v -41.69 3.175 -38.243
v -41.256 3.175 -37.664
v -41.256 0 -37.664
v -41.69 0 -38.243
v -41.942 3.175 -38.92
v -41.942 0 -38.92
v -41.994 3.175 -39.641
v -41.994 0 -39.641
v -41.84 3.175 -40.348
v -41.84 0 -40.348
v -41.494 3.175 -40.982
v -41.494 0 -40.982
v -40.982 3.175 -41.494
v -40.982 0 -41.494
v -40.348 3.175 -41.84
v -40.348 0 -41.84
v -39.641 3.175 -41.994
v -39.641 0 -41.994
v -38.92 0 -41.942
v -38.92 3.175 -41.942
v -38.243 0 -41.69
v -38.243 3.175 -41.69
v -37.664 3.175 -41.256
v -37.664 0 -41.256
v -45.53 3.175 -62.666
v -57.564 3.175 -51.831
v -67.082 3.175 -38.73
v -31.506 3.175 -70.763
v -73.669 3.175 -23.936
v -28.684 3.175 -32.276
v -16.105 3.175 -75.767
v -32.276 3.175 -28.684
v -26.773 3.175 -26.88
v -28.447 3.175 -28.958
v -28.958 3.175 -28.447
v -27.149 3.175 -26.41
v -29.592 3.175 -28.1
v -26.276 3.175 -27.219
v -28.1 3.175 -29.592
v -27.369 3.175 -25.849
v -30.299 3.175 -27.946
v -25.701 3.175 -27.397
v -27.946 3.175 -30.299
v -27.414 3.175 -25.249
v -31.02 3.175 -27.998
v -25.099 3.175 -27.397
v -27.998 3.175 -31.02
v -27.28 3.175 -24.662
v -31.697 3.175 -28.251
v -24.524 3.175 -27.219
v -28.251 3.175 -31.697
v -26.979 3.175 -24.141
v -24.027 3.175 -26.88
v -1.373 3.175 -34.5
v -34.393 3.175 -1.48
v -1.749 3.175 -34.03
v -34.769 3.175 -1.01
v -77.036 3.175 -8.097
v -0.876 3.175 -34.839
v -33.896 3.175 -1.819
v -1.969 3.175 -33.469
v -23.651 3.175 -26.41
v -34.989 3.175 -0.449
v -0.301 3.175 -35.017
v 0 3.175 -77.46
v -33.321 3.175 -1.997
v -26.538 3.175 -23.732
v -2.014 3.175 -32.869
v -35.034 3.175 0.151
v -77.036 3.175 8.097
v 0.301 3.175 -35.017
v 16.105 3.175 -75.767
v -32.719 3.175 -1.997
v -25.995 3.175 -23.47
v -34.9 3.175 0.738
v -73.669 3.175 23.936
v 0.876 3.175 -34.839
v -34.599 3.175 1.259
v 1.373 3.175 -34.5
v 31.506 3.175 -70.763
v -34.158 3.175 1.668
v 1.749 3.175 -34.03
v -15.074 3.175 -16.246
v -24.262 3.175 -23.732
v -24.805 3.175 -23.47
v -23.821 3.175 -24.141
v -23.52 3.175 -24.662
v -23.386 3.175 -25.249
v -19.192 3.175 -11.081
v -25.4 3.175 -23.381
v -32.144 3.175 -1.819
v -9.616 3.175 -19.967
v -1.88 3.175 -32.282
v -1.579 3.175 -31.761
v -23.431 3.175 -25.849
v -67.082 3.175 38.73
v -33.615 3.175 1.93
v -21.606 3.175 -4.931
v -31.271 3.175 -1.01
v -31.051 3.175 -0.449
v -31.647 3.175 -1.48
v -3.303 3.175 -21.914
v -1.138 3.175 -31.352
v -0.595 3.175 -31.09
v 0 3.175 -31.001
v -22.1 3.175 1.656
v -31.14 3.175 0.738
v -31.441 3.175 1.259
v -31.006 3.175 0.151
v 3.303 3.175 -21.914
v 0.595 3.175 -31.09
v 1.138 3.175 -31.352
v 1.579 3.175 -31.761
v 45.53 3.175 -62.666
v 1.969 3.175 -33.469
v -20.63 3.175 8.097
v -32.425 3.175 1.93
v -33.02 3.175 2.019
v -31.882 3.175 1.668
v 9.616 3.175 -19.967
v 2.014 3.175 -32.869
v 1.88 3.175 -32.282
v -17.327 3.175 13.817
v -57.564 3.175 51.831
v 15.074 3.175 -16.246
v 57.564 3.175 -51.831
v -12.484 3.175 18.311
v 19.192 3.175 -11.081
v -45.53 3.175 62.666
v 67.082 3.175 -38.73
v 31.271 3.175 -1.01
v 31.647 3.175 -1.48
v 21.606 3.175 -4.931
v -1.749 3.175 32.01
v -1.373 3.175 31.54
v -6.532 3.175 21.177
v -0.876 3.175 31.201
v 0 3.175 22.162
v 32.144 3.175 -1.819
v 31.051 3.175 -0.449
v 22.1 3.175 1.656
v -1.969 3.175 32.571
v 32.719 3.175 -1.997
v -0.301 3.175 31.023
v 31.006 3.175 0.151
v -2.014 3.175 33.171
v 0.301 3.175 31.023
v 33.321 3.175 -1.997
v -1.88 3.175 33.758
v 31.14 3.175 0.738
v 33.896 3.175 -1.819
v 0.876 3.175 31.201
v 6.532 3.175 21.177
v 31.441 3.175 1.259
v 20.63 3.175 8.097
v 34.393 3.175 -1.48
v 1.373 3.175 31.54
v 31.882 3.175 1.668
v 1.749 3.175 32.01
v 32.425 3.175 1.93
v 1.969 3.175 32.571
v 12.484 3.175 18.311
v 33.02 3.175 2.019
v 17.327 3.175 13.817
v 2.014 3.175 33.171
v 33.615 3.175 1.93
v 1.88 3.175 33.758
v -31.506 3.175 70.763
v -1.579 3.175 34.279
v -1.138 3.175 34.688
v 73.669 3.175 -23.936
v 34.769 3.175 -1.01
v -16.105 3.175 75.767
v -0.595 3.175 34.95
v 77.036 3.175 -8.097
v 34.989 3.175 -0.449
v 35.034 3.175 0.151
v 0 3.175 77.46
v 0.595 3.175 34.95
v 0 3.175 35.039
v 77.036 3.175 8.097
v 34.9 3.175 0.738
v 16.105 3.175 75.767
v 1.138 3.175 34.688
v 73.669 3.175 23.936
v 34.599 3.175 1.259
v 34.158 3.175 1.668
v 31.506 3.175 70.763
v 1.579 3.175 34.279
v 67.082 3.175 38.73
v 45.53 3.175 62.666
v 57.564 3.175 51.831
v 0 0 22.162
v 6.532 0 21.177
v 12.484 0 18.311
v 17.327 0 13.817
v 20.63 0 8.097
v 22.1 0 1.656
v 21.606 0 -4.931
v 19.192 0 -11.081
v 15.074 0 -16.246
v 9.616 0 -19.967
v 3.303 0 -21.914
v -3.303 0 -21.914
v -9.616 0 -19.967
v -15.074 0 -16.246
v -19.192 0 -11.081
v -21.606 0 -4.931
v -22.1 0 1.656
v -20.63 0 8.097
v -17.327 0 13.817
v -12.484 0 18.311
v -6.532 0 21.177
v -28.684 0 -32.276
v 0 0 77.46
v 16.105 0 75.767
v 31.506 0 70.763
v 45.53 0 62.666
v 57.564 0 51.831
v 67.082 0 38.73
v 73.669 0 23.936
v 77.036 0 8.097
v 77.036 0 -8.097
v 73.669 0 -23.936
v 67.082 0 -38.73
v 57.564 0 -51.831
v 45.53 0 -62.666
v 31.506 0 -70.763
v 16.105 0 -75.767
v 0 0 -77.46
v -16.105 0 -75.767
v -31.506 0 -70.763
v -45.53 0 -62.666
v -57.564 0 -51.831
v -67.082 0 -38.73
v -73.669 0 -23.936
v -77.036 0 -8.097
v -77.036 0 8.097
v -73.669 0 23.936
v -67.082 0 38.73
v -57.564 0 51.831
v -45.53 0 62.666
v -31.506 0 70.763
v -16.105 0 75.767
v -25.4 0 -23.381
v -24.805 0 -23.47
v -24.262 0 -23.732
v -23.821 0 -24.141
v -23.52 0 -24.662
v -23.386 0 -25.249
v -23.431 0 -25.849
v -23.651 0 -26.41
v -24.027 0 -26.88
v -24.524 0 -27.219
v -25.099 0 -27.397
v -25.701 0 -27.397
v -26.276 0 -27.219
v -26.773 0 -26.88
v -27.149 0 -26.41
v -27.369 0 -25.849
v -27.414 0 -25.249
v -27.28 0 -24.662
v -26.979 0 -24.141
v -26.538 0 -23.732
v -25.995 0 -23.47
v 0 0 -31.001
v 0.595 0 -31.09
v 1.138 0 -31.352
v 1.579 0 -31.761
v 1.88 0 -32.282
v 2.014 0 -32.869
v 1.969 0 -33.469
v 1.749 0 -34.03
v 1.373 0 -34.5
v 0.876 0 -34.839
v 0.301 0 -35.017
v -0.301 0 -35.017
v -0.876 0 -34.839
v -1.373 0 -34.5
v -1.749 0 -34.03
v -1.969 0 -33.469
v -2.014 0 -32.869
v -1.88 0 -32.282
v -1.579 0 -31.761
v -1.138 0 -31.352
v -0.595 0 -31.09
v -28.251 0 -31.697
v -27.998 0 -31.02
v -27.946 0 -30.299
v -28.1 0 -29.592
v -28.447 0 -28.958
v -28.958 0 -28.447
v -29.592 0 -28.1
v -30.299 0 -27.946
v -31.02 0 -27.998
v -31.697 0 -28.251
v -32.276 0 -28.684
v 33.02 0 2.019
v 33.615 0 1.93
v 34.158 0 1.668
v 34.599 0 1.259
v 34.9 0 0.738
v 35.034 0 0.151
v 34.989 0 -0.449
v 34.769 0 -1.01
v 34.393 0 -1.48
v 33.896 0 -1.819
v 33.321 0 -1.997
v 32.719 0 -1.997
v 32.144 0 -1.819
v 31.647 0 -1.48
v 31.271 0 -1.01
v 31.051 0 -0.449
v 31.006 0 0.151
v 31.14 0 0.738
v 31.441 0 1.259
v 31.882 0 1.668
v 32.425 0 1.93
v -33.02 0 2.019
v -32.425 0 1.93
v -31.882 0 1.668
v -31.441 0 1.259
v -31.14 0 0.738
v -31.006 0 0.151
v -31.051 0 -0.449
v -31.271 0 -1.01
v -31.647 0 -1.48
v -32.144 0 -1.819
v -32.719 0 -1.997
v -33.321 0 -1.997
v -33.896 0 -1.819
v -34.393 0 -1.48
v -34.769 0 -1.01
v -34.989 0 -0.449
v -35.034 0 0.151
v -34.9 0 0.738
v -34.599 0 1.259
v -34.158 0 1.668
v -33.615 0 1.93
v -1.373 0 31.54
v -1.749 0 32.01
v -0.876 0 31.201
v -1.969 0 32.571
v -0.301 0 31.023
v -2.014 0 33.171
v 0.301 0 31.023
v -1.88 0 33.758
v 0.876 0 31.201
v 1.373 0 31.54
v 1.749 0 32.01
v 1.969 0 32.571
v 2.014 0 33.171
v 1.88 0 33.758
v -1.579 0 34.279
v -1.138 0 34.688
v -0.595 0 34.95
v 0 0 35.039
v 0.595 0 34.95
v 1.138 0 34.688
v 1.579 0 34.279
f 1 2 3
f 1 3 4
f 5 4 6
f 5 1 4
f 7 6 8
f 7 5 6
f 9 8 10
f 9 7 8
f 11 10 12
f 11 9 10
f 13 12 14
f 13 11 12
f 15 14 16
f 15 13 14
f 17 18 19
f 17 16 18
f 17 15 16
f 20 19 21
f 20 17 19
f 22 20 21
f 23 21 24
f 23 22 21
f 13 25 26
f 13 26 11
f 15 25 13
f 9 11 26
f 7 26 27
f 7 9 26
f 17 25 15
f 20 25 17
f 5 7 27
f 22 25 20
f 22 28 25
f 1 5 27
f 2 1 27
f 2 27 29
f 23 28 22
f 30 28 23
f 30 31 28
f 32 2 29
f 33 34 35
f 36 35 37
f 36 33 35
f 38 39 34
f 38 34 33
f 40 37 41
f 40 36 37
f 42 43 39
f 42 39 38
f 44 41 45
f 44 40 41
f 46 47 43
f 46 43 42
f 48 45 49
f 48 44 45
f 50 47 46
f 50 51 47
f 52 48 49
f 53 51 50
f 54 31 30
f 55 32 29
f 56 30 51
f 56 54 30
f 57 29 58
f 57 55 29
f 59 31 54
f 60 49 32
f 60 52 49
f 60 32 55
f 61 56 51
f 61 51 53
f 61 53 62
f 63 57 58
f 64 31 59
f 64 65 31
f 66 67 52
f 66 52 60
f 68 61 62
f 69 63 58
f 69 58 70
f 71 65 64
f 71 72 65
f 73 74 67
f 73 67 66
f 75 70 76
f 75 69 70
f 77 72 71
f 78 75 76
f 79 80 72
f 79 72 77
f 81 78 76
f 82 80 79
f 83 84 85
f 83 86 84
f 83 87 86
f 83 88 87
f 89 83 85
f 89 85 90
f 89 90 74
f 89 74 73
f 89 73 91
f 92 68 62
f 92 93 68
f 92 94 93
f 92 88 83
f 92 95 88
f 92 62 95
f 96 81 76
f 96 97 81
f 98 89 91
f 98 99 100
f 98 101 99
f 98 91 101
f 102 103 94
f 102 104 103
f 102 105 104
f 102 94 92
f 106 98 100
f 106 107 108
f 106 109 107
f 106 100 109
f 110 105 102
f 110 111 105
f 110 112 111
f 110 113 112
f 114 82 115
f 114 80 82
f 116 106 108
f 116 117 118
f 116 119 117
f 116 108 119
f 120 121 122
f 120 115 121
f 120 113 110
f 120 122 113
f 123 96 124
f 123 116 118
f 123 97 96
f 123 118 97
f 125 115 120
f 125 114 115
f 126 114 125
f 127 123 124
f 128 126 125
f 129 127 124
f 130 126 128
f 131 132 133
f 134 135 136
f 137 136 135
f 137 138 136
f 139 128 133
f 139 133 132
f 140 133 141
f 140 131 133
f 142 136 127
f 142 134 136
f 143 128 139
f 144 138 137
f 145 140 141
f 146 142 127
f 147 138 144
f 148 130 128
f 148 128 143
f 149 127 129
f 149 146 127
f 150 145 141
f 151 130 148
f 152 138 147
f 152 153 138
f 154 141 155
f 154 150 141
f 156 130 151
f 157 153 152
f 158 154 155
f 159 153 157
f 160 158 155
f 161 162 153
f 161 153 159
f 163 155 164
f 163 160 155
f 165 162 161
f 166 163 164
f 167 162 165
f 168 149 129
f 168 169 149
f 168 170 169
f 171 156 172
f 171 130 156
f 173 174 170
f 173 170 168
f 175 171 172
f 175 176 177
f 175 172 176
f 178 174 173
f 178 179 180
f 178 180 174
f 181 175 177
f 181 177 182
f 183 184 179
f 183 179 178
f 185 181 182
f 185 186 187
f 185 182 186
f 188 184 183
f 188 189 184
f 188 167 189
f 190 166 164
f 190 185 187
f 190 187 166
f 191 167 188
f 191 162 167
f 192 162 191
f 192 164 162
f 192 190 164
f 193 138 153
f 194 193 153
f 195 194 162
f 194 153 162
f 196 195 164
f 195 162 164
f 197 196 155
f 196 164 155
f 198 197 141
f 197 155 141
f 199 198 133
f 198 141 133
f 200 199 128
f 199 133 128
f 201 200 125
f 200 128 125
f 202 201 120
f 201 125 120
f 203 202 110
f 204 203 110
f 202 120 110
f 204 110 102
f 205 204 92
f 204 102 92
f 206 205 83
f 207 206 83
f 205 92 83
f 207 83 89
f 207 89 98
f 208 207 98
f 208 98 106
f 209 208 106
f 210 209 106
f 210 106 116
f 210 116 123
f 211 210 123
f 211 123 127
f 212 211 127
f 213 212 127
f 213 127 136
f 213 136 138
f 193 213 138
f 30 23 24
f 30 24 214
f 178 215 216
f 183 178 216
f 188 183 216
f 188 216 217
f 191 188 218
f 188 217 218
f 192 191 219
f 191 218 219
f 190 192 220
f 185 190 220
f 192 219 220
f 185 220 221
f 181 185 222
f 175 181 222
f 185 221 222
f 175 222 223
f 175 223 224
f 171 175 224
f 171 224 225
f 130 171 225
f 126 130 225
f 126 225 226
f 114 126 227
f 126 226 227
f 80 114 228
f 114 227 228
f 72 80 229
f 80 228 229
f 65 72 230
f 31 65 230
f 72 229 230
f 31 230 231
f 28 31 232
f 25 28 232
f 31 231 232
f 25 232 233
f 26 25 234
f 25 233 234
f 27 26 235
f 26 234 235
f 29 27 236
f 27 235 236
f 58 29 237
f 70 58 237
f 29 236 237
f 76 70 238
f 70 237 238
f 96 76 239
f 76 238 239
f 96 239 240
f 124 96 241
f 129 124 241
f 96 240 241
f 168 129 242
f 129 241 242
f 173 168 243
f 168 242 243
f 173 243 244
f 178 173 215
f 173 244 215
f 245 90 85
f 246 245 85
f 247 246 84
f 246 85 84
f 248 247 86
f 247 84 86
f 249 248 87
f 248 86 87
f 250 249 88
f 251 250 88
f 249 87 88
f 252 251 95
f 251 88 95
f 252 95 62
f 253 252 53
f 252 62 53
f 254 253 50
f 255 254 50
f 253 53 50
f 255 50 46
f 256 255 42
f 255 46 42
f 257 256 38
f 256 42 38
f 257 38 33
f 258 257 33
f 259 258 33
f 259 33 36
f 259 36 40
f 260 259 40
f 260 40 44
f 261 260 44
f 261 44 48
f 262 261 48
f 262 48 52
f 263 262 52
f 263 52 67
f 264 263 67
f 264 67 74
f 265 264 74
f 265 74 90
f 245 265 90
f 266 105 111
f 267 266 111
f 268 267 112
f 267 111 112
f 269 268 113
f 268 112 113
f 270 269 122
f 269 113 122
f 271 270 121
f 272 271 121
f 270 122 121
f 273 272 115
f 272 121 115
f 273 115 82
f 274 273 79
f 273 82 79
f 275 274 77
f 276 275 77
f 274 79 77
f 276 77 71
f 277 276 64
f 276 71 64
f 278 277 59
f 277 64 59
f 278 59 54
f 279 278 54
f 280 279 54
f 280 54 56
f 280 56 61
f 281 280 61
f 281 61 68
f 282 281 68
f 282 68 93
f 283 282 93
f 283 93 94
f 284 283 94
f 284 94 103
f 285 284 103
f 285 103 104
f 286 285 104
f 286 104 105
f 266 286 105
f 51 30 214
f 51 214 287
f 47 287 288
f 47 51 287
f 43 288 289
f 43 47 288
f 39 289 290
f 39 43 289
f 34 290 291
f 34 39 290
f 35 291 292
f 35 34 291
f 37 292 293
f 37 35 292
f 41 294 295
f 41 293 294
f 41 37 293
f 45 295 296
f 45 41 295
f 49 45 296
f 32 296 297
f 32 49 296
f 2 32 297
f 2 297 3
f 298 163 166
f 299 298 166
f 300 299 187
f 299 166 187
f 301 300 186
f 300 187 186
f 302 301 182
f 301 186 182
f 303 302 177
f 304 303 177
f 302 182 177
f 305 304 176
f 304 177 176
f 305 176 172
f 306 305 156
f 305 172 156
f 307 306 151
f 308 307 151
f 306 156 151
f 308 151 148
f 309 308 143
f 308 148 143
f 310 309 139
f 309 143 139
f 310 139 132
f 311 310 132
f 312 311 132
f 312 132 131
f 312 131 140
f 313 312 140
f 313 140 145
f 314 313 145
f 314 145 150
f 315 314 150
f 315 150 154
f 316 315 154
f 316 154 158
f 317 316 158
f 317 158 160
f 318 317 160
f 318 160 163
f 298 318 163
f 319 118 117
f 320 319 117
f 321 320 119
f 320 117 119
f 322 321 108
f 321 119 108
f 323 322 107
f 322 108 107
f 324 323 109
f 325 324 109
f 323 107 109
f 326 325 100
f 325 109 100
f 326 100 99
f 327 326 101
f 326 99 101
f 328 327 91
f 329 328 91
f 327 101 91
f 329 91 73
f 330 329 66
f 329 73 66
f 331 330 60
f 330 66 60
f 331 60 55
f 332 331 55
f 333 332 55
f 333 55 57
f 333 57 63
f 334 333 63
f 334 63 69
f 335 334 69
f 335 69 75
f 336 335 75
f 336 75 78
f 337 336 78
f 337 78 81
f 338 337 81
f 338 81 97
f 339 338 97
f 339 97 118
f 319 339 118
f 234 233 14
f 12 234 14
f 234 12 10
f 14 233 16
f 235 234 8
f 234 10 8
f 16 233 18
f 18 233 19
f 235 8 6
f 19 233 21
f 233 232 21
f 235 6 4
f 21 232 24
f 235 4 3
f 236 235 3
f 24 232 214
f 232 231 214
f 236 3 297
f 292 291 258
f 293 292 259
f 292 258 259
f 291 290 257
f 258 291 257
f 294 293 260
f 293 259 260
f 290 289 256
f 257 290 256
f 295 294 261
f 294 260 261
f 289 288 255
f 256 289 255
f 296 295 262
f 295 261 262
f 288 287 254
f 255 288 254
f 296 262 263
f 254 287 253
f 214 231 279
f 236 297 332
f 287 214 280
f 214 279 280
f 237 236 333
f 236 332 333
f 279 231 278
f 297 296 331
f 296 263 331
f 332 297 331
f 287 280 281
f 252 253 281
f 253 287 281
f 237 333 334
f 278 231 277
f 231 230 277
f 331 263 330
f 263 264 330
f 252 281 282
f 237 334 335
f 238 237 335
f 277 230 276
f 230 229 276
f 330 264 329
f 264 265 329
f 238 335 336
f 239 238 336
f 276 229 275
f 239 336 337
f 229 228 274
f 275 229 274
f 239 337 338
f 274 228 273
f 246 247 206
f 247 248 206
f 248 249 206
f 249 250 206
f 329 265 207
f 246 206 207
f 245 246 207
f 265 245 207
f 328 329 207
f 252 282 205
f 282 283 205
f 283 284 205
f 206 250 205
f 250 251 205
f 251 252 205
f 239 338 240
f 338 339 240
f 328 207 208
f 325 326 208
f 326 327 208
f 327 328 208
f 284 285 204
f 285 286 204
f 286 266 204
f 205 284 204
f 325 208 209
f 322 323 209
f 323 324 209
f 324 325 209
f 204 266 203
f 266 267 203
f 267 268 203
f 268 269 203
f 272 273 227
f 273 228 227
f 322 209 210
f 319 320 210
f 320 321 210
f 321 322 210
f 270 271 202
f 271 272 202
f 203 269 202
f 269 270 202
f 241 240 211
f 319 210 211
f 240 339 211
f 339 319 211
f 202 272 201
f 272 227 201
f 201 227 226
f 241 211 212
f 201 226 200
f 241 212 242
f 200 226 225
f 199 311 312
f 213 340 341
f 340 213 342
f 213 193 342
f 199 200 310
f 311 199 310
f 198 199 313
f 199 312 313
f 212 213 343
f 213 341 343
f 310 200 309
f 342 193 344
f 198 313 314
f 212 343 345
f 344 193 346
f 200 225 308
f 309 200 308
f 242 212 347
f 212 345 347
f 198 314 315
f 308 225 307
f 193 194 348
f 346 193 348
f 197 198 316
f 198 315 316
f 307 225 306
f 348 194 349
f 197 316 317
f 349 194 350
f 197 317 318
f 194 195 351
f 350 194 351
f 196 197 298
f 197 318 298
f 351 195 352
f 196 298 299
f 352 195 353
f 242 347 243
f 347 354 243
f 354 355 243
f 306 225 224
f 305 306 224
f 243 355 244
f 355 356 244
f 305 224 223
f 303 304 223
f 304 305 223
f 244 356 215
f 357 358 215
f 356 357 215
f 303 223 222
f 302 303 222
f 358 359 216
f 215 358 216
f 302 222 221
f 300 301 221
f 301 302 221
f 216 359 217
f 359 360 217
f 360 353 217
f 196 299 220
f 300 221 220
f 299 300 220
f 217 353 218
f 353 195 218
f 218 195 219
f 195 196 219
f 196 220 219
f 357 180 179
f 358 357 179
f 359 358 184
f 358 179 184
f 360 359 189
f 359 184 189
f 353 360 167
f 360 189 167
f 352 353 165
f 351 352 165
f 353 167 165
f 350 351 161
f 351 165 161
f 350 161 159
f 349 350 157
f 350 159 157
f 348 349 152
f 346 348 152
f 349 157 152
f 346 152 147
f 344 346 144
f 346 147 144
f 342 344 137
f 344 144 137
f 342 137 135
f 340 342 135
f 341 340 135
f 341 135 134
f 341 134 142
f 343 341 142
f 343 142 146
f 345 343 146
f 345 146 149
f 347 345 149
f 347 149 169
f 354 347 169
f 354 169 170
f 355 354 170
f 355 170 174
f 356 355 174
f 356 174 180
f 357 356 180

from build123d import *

# Parameters (mm, degrees)
SKETCH1_R           = 77.4600051
BOSS_EXTRUDE1_DEPTH = 3.175
SKETCH24_R          = 22.1615
SKETCH24_R_2        = 2.0193
CUT_EXTRUDE14_DEPTH = 110.590991442


with BuildPart() as part:
    # Sketch1 → Boss-Extrude1 (new body)
    with BuildSketch(Plane(origin=(0, 0, 0), x_dir=(1, 0, 0), z_dir=(0, 1, 0))):
        with Locations(Location((0, 0, 0), (0, 0, 270))):
            Circle(SKETCH1_R)
    extrude(amount=BOSS_EXTRUDE1_DEPTH)

    # Sketch24 → Cut-Extrude14 (cut, through all)
    with BuildSketch(Plane(origin=(0, 3.175, 0), x_dir=(1, 0, 0), z_dir=(0, 1, 0))):
        with Locations(Location((0, 0, 0), (0, 0, 270))):
            Circle(SKETCH24_R)
        with Locations(Location((-25.4, 25.4, 0), (0, 0, 270))):
            Circle(SKETCH24_R_2)
        with Locations(Location((0, 33.02, 0), (0, 0, 270))):
            Circle(SKETCH24_R_2)
        with Locations(Location((33.02, 0, 0), (0, 0, 270))):
            Circle(SKETCH24_R_2)
        with Locations(Location((0, -33.02, 0), (0, 0, 270))):
            Circle(SKETCH24_R_2)
        with Locations(Location((-33.02, 0, 0), (0, 0, 270))):
            Circle(SKETCH24_R_2)
        with BuildLine():
            Line((-32.276051224, 28.683948776), (-41.256307345, 37.664204897))
            ThreePointArc((-41.256307345, 37.664204897), (-41.256307345, 41.256307345), (-37.664204897, 41.256307345))
            Line((-37.664204897, 41.256307345), (-28.683948776, 32.276051224))
            ThreePointArc((-28.683948776, 32.276051224), (-28.683948776, 28.683948776), (-32.276051224, 28.683948776))
        make_face()
    extrude(amount=-CUT_EXTRUDE14_DEPTH, mode=Mode.SUBTRACT)


solid = part.part
